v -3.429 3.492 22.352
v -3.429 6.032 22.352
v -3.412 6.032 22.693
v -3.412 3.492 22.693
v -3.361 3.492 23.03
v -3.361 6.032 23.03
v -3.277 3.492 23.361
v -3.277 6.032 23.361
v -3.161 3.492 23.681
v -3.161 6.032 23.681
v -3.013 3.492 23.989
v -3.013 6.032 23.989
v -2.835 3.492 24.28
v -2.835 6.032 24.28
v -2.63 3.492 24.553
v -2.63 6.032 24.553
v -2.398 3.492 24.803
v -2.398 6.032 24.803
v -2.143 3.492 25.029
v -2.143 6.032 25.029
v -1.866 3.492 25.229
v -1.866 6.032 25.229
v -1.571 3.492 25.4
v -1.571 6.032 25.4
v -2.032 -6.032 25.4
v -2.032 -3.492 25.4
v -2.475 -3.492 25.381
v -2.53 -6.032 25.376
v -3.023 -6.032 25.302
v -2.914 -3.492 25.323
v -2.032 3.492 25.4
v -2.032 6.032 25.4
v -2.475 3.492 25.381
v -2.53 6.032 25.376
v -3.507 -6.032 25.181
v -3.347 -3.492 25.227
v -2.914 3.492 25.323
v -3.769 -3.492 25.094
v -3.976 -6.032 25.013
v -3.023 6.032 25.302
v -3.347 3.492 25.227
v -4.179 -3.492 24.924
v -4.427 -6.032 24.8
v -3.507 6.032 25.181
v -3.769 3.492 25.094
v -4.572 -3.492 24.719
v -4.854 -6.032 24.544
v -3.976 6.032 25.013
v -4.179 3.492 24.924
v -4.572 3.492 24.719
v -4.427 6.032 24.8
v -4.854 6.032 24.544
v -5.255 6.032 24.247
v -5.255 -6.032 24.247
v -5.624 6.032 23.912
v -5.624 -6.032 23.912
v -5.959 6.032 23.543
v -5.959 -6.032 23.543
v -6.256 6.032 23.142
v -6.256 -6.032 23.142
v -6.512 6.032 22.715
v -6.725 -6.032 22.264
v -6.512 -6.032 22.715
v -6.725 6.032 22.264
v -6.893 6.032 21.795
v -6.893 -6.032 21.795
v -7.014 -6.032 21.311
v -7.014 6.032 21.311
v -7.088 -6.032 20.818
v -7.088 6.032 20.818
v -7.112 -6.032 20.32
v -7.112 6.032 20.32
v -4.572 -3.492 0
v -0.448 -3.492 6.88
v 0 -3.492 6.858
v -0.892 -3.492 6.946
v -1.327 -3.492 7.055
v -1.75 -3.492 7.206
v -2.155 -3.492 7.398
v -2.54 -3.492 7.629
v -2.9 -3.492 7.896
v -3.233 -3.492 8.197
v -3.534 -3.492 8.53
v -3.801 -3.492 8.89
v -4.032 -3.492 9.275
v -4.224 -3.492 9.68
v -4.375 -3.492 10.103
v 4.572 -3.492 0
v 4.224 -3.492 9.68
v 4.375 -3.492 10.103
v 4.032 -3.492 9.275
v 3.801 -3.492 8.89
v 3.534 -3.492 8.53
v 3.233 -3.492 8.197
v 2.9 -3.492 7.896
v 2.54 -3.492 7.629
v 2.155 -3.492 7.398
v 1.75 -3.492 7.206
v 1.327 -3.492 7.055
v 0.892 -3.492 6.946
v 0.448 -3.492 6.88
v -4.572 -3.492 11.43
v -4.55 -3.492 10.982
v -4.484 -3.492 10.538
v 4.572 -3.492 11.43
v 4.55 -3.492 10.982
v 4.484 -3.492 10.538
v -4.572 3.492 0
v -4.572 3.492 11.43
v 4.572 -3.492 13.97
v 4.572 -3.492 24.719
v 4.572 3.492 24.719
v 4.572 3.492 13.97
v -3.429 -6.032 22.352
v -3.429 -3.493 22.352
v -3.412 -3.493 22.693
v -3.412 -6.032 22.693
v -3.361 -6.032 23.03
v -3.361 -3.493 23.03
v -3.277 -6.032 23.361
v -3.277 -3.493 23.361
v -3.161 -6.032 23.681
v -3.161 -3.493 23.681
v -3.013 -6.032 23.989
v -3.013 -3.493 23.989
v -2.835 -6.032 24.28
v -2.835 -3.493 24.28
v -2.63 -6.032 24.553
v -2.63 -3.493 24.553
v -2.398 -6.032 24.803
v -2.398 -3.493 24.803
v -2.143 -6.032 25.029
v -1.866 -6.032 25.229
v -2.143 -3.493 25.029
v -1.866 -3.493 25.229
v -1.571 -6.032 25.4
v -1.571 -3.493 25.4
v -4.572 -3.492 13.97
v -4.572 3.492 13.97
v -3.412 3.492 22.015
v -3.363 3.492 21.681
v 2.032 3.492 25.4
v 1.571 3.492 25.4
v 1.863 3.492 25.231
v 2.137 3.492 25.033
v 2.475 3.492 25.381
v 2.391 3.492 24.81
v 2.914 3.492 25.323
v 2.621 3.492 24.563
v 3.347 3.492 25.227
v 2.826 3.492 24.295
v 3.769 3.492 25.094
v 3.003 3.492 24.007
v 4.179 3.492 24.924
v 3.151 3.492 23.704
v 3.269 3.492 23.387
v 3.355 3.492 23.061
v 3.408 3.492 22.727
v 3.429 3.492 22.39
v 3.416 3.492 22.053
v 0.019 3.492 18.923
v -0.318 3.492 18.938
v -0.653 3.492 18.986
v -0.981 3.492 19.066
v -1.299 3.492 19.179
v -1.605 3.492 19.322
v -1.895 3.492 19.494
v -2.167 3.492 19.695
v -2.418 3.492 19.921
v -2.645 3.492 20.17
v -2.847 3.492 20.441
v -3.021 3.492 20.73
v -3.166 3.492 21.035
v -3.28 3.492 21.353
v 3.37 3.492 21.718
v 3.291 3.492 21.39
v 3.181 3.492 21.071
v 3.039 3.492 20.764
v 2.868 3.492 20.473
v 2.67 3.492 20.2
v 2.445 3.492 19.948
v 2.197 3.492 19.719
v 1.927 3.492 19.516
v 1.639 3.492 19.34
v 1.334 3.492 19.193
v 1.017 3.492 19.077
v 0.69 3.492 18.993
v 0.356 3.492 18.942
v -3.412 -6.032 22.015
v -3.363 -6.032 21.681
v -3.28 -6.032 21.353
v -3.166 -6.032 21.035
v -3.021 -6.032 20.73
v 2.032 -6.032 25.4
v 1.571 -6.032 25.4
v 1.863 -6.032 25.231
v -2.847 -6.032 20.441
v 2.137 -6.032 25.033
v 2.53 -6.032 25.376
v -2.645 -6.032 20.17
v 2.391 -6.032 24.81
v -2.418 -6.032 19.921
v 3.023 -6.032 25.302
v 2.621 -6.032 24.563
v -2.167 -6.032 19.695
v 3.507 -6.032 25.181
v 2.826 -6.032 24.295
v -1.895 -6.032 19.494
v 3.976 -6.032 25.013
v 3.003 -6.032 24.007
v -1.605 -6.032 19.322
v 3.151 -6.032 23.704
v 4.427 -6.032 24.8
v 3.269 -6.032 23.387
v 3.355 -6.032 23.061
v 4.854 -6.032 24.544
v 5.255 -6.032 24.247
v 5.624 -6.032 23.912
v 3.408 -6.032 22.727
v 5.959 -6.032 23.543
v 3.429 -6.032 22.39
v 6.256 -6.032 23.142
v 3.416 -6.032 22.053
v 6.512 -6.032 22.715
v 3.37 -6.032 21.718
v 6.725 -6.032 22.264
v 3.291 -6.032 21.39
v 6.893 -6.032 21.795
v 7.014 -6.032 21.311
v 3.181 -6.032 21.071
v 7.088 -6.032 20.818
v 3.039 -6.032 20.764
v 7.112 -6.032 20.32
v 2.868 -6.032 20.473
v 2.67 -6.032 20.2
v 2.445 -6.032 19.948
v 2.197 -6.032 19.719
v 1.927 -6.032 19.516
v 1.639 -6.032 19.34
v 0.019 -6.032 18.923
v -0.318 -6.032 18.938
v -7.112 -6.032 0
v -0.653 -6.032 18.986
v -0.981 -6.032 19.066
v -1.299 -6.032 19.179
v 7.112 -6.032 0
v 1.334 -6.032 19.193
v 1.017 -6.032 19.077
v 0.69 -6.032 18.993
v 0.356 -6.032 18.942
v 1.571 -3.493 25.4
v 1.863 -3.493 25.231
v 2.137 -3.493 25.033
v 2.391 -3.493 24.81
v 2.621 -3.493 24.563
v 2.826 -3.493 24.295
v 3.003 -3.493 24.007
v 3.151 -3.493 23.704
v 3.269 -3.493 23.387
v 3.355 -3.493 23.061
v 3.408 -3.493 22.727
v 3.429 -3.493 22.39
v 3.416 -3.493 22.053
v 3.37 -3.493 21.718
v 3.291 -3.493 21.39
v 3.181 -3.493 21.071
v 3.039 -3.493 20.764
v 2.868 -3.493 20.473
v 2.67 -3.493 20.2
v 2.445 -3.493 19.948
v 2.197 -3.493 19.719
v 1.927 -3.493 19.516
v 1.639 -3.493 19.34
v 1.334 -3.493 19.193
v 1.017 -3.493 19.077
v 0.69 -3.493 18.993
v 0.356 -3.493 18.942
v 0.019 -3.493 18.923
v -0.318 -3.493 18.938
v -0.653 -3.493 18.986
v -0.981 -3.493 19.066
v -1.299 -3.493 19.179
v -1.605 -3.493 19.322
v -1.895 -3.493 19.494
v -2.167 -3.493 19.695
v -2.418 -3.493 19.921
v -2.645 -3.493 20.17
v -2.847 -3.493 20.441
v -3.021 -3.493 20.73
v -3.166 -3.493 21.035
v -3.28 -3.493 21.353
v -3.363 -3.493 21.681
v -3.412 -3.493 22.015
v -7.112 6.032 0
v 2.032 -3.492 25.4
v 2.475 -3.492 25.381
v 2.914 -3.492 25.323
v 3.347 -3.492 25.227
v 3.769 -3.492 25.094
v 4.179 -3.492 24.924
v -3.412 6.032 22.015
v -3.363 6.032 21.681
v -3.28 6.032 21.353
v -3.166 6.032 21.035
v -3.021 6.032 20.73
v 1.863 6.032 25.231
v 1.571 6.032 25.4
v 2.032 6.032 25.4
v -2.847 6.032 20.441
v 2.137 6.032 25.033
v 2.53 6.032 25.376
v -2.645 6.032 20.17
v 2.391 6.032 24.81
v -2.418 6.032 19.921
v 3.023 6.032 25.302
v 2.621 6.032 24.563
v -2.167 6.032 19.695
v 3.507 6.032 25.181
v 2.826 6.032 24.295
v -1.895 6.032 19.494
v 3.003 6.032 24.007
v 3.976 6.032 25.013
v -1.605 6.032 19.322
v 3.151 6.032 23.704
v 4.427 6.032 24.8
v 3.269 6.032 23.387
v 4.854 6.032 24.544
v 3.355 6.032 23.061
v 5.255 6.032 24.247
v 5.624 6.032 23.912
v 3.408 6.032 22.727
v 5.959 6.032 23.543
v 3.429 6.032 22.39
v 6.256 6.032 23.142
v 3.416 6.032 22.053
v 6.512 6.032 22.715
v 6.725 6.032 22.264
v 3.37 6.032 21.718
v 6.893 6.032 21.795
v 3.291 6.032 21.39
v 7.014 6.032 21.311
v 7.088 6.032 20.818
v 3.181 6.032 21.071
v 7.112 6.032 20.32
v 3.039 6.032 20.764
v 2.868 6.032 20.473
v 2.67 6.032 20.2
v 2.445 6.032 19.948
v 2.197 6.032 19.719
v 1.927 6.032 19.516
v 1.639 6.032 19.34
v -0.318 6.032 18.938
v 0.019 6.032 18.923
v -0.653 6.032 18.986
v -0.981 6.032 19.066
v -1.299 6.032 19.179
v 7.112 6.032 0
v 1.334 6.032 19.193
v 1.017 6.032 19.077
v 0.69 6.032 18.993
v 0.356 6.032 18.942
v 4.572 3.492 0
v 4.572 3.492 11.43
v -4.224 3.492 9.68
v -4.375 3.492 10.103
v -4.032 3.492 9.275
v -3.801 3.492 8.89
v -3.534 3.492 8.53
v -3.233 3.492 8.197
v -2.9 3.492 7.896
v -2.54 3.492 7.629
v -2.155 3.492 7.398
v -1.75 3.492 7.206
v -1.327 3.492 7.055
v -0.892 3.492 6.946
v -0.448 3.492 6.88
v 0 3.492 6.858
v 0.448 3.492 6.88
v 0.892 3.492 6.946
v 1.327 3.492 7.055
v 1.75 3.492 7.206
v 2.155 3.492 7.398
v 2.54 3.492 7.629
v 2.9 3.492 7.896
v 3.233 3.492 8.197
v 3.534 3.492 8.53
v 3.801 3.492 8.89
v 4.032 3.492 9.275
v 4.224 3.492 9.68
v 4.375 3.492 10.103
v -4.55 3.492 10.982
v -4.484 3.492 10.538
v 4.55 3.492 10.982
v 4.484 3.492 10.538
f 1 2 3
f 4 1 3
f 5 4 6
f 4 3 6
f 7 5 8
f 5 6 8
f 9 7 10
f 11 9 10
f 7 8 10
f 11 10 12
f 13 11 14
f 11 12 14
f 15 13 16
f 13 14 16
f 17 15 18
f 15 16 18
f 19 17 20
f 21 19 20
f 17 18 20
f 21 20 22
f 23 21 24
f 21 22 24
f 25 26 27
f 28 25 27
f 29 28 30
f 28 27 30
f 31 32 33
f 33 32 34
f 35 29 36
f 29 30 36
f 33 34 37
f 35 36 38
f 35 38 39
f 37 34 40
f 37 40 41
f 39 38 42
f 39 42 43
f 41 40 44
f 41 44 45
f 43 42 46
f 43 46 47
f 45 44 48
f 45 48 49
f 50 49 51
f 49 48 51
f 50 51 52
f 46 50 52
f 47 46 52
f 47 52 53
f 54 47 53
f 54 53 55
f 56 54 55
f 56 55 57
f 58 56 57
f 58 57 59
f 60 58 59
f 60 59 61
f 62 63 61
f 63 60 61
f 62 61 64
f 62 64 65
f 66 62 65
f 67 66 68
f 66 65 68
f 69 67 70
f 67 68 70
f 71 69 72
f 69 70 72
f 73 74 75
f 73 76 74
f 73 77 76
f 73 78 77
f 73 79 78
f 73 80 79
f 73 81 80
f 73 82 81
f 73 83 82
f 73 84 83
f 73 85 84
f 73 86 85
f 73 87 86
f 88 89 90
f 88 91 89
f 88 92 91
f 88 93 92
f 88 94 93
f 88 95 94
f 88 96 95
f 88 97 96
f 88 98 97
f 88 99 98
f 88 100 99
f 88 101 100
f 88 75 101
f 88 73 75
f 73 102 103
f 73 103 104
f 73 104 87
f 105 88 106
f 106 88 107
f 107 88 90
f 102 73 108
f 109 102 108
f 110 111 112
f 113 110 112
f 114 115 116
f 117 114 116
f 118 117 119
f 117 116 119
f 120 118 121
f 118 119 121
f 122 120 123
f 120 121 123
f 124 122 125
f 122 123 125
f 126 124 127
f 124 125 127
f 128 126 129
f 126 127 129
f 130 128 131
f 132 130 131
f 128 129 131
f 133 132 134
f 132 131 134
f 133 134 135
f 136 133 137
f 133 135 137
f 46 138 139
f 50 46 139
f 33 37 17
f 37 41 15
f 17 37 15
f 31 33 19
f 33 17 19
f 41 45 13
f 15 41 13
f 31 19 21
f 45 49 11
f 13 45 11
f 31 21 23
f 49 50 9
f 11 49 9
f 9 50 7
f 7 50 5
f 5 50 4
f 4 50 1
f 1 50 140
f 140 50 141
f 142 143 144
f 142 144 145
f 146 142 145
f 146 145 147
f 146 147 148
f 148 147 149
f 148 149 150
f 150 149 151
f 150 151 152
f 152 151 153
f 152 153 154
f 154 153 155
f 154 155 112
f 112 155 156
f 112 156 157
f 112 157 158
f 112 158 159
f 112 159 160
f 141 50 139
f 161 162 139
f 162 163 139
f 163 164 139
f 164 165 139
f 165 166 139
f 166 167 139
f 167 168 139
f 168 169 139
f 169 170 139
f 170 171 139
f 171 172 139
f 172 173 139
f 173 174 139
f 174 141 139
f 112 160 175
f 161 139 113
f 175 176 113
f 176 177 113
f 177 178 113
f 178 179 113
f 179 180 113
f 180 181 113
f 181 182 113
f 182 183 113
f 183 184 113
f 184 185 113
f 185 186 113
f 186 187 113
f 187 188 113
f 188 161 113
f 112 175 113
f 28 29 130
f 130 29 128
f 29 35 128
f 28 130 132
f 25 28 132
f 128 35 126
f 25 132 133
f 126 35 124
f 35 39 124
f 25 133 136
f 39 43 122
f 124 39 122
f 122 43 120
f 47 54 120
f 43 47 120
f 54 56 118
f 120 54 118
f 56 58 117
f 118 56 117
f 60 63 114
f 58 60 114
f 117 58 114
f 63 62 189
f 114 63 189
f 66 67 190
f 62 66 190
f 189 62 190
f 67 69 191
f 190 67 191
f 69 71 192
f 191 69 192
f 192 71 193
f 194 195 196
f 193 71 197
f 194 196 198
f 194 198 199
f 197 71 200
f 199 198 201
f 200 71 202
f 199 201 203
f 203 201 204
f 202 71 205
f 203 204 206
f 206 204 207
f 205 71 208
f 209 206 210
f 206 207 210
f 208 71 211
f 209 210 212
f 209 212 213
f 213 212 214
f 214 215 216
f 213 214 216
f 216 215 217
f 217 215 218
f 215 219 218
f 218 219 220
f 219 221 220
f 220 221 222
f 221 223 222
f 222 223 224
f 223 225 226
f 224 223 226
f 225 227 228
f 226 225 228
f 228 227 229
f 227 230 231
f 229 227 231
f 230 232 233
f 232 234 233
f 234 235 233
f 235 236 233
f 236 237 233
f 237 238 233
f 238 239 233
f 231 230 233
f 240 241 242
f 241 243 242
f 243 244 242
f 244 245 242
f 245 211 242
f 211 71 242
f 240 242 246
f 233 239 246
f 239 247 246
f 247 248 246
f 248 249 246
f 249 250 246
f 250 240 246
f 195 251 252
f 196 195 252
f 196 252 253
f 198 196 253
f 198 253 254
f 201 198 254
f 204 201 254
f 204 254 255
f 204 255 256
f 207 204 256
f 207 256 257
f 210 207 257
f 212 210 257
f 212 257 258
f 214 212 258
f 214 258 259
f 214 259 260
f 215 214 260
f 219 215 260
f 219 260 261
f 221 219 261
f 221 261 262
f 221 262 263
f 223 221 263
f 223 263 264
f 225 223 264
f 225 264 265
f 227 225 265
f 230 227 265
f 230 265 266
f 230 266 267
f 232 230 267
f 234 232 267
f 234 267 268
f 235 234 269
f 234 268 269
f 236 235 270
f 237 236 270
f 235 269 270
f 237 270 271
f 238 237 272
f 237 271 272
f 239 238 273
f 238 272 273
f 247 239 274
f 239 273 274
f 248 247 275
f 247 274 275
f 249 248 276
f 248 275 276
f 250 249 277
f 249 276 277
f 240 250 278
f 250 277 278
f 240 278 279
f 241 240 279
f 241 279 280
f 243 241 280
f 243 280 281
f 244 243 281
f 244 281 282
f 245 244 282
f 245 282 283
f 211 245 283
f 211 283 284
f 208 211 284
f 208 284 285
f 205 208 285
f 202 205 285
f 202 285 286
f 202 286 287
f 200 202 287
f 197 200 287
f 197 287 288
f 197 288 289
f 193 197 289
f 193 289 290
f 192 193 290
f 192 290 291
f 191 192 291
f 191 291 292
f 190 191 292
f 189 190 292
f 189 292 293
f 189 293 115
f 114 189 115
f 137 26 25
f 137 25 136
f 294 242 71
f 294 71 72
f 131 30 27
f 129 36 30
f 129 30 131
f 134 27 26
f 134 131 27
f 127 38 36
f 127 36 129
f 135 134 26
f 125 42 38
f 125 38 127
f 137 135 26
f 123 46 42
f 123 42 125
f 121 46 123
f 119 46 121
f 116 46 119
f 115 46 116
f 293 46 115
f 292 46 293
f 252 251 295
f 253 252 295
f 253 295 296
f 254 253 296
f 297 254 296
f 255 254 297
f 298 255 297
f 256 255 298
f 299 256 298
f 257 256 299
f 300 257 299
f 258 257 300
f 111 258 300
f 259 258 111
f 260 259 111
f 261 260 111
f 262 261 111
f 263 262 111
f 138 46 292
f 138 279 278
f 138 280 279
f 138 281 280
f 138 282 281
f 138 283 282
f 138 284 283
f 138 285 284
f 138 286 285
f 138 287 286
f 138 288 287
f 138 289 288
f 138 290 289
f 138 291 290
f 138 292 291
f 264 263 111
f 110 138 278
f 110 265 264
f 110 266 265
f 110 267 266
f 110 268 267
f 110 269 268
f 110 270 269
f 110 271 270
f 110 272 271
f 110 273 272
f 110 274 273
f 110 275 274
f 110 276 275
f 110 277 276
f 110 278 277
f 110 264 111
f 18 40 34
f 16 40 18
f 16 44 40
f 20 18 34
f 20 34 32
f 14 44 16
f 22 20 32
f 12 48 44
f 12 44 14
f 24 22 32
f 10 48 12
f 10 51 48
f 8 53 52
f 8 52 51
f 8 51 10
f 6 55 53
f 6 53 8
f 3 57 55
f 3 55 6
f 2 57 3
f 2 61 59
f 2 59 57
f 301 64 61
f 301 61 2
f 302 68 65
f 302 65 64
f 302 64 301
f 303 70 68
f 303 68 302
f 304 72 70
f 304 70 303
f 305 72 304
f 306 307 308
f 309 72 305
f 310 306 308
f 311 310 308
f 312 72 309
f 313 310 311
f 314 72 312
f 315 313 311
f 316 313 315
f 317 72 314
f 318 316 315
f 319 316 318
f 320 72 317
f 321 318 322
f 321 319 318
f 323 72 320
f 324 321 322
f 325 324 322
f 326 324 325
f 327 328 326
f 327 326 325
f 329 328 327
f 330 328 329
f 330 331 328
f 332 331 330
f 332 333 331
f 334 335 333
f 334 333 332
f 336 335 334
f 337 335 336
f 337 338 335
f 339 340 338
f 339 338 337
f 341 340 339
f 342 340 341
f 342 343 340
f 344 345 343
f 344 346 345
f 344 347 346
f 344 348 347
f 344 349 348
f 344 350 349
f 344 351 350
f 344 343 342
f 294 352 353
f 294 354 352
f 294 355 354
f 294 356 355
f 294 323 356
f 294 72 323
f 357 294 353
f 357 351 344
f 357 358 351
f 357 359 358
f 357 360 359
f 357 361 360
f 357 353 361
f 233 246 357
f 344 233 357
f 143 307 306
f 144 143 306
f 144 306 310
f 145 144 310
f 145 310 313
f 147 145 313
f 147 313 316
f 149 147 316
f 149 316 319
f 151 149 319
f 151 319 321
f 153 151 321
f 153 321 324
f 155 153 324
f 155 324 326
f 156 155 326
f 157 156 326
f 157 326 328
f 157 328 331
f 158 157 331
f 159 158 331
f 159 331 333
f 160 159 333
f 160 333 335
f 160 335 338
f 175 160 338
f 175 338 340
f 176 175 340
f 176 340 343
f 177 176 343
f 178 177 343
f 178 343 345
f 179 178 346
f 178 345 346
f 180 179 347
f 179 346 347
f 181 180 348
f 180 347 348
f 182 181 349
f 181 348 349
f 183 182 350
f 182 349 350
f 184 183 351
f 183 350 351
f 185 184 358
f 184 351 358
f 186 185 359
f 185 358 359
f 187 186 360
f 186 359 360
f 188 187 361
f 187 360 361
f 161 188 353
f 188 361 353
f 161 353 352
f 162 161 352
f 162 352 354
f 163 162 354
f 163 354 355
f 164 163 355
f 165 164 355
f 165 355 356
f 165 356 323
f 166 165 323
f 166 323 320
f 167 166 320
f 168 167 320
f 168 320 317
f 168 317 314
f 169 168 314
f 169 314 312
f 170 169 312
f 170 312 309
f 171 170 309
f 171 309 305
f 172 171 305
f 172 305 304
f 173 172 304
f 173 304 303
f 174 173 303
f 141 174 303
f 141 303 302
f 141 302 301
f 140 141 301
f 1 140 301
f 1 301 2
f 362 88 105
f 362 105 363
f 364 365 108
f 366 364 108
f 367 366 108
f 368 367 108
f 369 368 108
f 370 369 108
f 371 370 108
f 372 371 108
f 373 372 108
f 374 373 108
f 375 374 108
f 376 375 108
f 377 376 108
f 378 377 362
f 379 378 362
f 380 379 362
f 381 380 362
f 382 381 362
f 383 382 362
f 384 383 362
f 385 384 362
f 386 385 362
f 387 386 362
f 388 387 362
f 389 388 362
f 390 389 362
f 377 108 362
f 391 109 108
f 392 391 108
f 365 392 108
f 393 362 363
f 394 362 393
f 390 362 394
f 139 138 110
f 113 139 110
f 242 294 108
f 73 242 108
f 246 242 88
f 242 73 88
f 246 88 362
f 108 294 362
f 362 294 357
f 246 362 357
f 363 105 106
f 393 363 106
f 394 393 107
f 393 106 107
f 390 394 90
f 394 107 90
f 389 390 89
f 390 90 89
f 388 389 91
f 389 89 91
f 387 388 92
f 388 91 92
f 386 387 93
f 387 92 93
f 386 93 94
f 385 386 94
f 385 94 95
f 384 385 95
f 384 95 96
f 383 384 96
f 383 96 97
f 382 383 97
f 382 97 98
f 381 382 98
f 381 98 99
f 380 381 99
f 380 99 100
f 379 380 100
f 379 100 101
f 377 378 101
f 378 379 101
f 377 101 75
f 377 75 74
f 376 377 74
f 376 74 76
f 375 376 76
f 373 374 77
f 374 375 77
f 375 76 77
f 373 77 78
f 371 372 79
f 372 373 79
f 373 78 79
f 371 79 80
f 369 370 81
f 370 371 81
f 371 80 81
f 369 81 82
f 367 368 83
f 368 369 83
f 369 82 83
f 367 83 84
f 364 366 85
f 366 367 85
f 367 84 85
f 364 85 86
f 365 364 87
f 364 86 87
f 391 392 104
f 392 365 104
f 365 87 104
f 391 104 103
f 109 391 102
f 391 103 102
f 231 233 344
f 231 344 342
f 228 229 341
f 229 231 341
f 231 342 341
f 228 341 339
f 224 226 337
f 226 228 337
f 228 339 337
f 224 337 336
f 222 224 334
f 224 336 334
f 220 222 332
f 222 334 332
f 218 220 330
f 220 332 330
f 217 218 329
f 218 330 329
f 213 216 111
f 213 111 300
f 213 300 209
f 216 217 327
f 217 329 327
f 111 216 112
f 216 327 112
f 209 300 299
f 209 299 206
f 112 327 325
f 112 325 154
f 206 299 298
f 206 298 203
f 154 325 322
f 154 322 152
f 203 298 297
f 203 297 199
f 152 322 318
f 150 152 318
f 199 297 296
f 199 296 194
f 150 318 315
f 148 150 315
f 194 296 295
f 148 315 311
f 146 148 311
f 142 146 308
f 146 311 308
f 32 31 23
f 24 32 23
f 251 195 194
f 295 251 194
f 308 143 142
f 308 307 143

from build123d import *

# Parameters (mm, degrees)
F0_W        = 14.224
F0_H        = 12.065
F0_W_2      = 9.144
F0_H_2      = 6.985
F1_DEPTH    = 25.4
F3_DEPTH    = 8.89
F5_DEPTH    = 25.4
F6_T1_DEPTH = 37.465


# Not quite as in the source:
# - a fillet or chamfer that OpenCascade refuses, or shapes differently, is made with other operations: its cross-section is extruded or revolved along the edge and cut away or added


with BuildPart() as f1:
    # F0 (on Top) → F1 (new body)
    with BuildSketch(Plane.XY):
        Rectangle(F0_W, F0_H)
        Rectangle(F0_W_2, F0_H_2, mode=Mode.SUBTRACT)
    extrude(amount=F1_DEPTH)

    # F2 (on face) → F3 (join)
    with BuildSketch(Plane(origin=(0, -3.4925, 0), x_dir=(-1, 0, 0), z_dir=(0, 1, 0))):
        with BuildLine():
            Line((3.801523905, 13.97), (-3.801523905, 13.97))
            ThreePointArc((-3.801523905, 13.97), (-4.3751429287, 12.7571429287), (-4.572, 11.43))
            Line((-4.572, 11.43), (4.572, 11.43))
            ThreePointArc((4.572, 11.43), (4.3751429287, 12.7571429287), (3.801523905, 13.97))
        make_face()
        with BuildLine():
            Line((-3.801523905, 13.97), (-4.572, 13.97))
            Line((-4.572, 13.97), (-4.572, 11.43))
            ThreePointArc((-4.572, 11.43), (-4.3751429287, 12.7571429287), (-3.801523905, 13.97))
        make_face()
        with BuildLine():
            Line((4.572, 13.97), (3.801523905, 13.97))
            ThreePointArc((3.801523905, 13.97), (4.3751429287, 12.7571429287), (4.572, 11.43))
            Line((4.572, 11.43), (4.572, 13.97))
        make_face()
        with BuildLine():
            Line((4.572, 11.43), (-4.572, 11.43))
            ThreePointArc((-4.572, 11.43), (0, 6.858), (4.572, 11.43))
        make_face()
    extrude(amount=F3_DEPTH)

    # F4 (on face) → F5 (cut)
    with BuildSketch(Plane(origin=(0, 6.0325, 0), x_dir=(-1, 0, 0), z_dir=(0, 1, 0))):
        with BuildLine():
            ThreePointArc((-1.5709032434, 25.4), (-1.784854865, 19.424145135), (3.429, 22.352))
            ThreePointArc((3.429, 22.352), (2.927854865, 24.136854865), (1.5709032434, 25.4))
            Line((1.5709032434, 25.4), (-1.5709032434, 25.4))
        make_face()
    extrude(amount=-F5_DEPTH, mode=Mode.SUBTRACT)

    # F6: fillet of radius 5.08 on 2 edges, made by hand

    # F6_s2 → F6_t1 (cut)
    with BuildSketch(Plane.XZ.offset(-18.7325)):
        with BuildLine():
            ThreePointArc((7.112, 20.32), (5.6241024484, 23.9121024484), (2.032, 25.4))
            Line((2.032, 25.4), (7.112, 25.4))
            Line((7.112, 25.4), (7.112, 20.32))
        make_face()
        with BuildLine():
            ThreePointArc((-2.032, 25.4), (-5.6241024484, 23.9121024484), (-7.112, 20.32))
            Line((-7.112, 20.32), (-7.112, 25.4))
            Line((-7.112, 25.4), (-2.032, 25.4))
        make_face()
    extrude(amount=F6_T1_DEPTH, mode=Mode.SUBTRACT)


solid = f1.part
